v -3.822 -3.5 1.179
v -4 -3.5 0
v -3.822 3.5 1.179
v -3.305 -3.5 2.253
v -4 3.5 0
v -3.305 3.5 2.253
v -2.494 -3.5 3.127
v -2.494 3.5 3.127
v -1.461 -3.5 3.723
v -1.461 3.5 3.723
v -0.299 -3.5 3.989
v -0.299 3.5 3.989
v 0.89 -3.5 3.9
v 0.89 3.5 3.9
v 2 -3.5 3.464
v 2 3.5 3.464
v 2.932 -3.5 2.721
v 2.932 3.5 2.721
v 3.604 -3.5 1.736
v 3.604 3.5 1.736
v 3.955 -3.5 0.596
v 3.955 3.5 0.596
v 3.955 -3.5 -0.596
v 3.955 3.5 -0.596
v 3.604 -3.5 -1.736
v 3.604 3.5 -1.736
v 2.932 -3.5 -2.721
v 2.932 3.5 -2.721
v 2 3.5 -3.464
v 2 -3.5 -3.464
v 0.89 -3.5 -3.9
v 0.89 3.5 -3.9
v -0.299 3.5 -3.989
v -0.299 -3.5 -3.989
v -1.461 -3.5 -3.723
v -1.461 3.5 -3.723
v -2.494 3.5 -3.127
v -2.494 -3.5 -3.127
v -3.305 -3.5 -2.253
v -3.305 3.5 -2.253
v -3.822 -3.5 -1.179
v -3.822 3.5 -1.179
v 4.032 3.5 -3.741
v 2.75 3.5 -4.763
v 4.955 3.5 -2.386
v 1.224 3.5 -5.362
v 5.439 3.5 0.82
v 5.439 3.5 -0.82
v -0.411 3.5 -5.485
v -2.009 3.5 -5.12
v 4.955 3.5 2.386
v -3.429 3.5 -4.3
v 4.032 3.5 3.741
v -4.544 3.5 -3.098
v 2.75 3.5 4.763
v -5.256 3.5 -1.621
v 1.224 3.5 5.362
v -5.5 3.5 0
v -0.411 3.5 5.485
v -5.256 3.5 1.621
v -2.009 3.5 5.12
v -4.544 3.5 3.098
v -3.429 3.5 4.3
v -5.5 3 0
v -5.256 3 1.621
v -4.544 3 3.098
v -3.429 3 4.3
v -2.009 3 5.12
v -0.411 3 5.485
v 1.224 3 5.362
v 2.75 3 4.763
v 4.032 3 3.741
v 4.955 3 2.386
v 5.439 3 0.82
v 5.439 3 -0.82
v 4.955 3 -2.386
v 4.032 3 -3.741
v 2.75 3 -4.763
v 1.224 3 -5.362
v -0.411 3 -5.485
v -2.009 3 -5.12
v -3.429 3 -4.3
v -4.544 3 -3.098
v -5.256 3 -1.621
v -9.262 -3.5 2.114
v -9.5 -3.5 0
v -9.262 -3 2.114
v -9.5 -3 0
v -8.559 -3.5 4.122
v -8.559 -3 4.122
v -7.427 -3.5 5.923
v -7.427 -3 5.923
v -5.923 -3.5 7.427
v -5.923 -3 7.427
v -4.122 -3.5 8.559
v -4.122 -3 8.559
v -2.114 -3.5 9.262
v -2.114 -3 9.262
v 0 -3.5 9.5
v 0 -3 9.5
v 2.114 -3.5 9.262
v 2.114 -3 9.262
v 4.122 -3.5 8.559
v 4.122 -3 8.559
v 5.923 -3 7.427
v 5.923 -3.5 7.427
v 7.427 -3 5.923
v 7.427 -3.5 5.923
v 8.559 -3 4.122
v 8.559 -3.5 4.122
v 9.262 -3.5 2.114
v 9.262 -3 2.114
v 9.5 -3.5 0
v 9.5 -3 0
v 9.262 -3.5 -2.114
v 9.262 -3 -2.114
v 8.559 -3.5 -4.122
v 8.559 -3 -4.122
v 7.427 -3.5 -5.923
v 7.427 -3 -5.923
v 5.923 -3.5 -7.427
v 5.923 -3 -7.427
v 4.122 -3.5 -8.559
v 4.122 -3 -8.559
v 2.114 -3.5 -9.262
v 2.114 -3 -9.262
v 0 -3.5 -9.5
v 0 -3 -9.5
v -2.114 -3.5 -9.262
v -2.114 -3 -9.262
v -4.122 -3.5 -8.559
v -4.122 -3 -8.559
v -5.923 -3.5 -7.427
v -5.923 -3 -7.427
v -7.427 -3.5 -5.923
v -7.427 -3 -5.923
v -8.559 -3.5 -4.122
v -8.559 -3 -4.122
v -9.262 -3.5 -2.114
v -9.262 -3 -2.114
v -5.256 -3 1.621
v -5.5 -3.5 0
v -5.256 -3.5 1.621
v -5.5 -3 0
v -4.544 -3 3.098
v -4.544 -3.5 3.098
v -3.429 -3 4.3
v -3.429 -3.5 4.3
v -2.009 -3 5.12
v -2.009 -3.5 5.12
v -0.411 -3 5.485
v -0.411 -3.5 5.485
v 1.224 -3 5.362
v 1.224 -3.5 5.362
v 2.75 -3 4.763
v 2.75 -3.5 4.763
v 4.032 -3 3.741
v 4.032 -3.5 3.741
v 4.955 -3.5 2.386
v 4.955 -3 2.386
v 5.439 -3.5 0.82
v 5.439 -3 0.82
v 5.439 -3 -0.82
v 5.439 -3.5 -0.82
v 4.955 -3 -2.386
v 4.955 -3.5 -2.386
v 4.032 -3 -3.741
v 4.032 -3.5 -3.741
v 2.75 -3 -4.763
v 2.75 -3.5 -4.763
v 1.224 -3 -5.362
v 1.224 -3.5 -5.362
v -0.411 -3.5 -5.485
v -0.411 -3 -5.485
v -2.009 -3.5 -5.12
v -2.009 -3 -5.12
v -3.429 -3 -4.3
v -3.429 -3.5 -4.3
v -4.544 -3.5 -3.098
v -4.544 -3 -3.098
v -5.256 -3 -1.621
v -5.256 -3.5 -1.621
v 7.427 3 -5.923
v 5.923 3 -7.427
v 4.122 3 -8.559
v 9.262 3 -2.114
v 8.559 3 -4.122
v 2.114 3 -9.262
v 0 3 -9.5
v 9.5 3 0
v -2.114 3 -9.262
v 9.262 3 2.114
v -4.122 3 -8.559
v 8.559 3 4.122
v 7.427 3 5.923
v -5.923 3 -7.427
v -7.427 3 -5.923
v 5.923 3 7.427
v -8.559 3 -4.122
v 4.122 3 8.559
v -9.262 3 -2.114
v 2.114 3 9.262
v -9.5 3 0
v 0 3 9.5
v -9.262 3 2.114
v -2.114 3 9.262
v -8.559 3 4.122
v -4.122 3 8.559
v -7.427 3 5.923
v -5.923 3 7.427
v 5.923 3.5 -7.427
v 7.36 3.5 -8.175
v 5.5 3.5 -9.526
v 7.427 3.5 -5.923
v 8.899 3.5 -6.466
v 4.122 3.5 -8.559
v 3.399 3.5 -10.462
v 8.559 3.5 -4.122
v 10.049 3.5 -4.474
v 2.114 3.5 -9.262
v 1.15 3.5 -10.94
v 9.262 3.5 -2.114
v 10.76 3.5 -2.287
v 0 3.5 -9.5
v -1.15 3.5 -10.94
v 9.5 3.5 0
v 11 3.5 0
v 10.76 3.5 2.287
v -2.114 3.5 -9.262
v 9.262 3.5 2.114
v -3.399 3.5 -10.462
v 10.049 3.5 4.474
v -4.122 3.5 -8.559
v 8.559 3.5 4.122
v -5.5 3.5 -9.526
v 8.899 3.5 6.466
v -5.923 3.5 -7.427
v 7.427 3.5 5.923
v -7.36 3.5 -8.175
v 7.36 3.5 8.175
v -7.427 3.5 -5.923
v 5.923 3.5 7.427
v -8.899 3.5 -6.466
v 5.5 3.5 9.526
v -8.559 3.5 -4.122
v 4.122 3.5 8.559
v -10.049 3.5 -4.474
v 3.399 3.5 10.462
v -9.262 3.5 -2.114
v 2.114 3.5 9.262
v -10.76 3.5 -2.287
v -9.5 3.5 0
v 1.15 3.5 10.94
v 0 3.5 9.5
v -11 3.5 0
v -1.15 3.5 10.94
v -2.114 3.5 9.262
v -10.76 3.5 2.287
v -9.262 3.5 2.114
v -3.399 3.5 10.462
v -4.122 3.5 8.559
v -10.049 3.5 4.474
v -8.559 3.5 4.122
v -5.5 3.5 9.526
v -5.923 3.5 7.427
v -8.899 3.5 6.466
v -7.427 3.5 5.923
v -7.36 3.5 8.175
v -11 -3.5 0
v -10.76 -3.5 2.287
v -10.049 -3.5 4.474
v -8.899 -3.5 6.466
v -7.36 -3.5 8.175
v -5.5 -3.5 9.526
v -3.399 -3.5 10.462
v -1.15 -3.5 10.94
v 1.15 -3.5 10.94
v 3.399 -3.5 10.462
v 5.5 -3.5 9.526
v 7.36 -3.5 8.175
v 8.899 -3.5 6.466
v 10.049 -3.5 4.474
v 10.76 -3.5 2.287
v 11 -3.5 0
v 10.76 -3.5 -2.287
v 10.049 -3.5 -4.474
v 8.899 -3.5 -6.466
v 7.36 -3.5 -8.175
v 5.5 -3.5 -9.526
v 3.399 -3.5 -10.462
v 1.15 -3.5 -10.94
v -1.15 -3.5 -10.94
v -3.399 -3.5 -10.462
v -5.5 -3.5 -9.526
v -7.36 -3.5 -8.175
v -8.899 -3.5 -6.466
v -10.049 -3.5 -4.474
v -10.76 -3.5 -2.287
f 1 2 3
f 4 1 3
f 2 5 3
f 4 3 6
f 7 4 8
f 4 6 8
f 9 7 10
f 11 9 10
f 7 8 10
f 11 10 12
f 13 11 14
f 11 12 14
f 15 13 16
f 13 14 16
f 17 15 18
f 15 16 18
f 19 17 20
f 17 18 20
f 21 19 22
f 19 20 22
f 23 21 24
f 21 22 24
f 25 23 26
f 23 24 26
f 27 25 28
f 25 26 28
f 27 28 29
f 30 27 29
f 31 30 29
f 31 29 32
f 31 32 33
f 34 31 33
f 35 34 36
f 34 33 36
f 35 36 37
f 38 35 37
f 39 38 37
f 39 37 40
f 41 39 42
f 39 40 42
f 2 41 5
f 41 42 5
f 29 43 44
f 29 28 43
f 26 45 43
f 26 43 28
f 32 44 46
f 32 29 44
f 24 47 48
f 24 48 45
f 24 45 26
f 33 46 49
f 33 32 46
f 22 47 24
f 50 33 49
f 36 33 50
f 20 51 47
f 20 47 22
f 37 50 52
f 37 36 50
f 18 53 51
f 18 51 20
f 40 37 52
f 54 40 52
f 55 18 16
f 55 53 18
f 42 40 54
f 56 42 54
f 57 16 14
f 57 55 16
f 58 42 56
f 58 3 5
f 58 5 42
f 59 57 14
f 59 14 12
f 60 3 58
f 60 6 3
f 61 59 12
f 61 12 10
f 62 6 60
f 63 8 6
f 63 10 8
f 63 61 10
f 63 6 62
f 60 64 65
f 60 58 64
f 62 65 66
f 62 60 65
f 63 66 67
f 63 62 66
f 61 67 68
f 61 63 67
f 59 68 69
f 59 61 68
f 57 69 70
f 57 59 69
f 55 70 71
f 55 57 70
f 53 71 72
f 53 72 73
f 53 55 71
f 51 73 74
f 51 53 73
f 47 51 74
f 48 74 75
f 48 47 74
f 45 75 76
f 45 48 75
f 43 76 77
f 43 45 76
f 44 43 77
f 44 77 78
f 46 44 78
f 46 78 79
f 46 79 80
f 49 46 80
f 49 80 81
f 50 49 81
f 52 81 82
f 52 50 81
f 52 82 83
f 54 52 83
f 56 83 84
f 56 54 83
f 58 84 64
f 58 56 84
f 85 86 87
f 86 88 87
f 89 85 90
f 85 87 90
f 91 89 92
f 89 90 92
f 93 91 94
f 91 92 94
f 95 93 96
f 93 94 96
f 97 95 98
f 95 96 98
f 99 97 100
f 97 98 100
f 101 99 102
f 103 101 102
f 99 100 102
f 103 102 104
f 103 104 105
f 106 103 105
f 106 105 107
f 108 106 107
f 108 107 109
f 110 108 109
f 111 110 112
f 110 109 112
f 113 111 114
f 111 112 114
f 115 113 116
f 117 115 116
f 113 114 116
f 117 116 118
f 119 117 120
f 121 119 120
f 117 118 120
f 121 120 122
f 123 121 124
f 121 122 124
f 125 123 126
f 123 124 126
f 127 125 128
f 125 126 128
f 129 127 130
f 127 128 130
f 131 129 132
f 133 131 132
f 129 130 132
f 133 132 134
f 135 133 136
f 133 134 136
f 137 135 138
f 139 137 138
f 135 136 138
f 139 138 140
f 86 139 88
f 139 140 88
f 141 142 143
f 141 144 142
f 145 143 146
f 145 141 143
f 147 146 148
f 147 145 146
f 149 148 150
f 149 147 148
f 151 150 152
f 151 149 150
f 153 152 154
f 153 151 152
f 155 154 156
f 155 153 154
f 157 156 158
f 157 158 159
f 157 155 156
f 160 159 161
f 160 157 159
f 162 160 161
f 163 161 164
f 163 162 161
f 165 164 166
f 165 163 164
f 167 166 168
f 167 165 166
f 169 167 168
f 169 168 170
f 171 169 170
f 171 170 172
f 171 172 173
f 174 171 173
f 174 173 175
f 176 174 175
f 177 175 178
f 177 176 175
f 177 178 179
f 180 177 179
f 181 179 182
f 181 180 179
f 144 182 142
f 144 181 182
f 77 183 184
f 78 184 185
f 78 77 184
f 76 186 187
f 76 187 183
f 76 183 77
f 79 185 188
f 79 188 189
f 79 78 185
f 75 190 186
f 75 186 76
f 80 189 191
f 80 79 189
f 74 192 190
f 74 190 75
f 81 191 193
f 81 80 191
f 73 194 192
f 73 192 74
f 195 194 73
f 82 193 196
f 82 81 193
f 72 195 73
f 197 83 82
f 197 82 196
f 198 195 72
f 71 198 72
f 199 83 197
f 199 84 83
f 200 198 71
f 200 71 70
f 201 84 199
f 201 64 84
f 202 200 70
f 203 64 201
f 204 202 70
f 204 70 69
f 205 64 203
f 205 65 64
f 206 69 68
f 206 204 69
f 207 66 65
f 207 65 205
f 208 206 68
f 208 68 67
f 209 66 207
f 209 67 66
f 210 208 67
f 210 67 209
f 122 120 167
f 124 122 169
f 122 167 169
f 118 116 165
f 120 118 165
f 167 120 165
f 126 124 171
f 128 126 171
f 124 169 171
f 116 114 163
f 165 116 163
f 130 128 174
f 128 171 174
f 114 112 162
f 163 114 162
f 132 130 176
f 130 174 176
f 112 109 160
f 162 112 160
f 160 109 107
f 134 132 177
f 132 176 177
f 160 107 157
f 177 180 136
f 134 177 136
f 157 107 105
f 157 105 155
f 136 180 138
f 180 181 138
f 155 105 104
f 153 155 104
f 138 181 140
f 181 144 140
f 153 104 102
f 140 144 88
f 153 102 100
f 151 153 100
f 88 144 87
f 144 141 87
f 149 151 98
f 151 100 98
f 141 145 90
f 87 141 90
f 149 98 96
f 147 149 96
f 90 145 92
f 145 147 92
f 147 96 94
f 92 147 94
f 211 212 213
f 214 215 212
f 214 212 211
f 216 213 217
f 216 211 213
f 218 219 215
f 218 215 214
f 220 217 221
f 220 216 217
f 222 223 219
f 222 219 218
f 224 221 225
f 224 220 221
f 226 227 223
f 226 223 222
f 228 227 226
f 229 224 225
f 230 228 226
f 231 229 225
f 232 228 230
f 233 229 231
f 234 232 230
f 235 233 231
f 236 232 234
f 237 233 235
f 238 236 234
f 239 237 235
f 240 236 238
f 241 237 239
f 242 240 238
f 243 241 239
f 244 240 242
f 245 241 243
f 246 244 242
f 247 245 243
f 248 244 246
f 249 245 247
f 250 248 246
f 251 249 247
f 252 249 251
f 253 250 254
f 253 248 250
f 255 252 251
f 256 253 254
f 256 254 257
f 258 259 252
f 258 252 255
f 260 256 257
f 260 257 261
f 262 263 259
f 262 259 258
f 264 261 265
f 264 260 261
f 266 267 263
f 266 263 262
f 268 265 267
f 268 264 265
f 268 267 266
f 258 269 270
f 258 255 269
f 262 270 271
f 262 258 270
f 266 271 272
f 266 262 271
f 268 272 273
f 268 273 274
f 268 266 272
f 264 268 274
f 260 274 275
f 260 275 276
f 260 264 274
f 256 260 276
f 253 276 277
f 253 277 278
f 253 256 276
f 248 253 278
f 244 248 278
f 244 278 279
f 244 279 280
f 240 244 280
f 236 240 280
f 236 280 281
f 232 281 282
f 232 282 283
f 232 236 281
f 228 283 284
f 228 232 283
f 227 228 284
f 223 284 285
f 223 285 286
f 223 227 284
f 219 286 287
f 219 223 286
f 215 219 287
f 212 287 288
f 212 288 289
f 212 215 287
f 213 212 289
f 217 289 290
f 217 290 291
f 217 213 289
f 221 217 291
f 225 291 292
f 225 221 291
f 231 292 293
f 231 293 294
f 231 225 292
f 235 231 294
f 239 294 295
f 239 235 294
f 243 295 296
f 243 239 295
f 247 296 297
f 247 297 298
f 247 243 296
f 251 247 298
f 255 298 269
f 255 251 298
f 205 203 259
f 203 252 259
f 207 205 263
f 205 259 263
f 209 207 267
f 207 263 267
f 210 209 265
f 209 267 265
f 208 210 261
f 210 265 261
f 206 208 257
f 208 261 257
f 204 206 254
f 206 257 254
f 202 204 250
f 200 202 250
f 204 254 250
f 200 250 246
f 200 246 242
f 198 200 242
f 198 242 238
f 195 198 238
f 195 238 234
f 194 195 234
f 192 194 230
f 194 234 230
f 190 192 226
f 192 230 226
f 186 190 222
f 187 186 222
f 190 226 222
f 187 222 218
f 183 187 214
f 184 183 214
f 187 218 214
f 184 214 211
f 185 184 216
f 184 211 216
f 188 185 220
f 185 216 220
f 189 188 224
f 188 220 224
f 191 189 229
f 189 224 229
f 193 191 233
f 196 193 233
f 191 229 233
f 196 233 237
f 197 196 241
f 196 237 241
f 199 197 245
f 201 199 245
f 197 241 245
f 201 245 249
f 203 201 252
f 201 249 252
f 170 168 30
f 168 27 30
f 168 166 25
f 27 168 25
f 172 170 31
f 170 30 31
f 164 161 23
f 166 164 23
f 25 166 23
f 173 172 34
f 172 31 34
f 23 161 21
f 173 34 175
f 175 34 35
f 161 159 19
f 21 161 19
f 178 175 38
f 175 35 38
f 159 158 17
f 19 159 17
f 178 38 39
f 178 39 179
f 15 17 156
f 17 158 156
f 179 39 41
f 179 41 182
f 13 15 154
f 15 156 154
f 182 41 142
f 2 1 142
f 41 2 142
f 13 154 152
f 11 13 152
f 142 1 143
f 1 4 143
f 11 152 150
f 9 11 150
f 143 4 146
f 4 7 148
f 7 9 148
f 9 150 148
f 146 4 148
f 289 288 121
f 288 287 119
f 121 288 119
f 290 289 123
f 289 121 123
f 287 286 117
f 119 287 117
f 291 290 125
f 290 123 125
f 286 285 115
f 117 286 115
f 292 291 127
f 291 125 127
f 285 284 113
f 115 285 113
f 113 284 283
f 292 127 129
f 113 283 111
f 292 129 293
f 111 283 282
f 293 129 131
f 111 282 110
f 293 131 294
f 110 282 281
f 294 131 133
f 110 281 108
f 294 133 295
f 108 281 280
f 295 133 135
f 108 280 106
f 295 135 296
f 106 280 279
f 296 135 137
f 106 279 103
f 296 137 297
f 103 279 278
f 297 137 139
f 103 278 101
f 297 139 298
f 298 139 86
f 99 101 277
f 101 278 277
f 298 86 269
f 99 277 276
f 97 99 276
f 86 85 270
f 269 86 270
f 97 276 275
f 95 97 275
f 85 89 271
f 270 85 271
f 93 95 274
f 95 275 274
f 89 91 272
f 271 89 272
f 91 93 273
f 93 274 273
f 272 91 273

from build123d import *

# Parameters (mm, degrees)
SKETCH1_W   = 1.5
SKETCH1_H   = 7
SKETCH1_W_2 = 4
SKETCH1_H_2 = 6


with BuildPart() as part:
    # Sketch1 → Revolve1 (revolve)
    with BuildSketch(Plane.XY):
        with Locations((-10.25, 0)):
            Rectangle(SKETCH1_W, SKETCH1_H)
        with Locations((-7.5, 0)):
            Rectangle(SKETCH1_W_2, SKETCH1_H_2)
        with Locations((-4.75, 0)):
            Rectangle(SKETCH1_W, SKETCH1_H)
    revolve(axis=Axis((0, -3.362712124, 0), (0, 1, 0)))


solid = part.part
